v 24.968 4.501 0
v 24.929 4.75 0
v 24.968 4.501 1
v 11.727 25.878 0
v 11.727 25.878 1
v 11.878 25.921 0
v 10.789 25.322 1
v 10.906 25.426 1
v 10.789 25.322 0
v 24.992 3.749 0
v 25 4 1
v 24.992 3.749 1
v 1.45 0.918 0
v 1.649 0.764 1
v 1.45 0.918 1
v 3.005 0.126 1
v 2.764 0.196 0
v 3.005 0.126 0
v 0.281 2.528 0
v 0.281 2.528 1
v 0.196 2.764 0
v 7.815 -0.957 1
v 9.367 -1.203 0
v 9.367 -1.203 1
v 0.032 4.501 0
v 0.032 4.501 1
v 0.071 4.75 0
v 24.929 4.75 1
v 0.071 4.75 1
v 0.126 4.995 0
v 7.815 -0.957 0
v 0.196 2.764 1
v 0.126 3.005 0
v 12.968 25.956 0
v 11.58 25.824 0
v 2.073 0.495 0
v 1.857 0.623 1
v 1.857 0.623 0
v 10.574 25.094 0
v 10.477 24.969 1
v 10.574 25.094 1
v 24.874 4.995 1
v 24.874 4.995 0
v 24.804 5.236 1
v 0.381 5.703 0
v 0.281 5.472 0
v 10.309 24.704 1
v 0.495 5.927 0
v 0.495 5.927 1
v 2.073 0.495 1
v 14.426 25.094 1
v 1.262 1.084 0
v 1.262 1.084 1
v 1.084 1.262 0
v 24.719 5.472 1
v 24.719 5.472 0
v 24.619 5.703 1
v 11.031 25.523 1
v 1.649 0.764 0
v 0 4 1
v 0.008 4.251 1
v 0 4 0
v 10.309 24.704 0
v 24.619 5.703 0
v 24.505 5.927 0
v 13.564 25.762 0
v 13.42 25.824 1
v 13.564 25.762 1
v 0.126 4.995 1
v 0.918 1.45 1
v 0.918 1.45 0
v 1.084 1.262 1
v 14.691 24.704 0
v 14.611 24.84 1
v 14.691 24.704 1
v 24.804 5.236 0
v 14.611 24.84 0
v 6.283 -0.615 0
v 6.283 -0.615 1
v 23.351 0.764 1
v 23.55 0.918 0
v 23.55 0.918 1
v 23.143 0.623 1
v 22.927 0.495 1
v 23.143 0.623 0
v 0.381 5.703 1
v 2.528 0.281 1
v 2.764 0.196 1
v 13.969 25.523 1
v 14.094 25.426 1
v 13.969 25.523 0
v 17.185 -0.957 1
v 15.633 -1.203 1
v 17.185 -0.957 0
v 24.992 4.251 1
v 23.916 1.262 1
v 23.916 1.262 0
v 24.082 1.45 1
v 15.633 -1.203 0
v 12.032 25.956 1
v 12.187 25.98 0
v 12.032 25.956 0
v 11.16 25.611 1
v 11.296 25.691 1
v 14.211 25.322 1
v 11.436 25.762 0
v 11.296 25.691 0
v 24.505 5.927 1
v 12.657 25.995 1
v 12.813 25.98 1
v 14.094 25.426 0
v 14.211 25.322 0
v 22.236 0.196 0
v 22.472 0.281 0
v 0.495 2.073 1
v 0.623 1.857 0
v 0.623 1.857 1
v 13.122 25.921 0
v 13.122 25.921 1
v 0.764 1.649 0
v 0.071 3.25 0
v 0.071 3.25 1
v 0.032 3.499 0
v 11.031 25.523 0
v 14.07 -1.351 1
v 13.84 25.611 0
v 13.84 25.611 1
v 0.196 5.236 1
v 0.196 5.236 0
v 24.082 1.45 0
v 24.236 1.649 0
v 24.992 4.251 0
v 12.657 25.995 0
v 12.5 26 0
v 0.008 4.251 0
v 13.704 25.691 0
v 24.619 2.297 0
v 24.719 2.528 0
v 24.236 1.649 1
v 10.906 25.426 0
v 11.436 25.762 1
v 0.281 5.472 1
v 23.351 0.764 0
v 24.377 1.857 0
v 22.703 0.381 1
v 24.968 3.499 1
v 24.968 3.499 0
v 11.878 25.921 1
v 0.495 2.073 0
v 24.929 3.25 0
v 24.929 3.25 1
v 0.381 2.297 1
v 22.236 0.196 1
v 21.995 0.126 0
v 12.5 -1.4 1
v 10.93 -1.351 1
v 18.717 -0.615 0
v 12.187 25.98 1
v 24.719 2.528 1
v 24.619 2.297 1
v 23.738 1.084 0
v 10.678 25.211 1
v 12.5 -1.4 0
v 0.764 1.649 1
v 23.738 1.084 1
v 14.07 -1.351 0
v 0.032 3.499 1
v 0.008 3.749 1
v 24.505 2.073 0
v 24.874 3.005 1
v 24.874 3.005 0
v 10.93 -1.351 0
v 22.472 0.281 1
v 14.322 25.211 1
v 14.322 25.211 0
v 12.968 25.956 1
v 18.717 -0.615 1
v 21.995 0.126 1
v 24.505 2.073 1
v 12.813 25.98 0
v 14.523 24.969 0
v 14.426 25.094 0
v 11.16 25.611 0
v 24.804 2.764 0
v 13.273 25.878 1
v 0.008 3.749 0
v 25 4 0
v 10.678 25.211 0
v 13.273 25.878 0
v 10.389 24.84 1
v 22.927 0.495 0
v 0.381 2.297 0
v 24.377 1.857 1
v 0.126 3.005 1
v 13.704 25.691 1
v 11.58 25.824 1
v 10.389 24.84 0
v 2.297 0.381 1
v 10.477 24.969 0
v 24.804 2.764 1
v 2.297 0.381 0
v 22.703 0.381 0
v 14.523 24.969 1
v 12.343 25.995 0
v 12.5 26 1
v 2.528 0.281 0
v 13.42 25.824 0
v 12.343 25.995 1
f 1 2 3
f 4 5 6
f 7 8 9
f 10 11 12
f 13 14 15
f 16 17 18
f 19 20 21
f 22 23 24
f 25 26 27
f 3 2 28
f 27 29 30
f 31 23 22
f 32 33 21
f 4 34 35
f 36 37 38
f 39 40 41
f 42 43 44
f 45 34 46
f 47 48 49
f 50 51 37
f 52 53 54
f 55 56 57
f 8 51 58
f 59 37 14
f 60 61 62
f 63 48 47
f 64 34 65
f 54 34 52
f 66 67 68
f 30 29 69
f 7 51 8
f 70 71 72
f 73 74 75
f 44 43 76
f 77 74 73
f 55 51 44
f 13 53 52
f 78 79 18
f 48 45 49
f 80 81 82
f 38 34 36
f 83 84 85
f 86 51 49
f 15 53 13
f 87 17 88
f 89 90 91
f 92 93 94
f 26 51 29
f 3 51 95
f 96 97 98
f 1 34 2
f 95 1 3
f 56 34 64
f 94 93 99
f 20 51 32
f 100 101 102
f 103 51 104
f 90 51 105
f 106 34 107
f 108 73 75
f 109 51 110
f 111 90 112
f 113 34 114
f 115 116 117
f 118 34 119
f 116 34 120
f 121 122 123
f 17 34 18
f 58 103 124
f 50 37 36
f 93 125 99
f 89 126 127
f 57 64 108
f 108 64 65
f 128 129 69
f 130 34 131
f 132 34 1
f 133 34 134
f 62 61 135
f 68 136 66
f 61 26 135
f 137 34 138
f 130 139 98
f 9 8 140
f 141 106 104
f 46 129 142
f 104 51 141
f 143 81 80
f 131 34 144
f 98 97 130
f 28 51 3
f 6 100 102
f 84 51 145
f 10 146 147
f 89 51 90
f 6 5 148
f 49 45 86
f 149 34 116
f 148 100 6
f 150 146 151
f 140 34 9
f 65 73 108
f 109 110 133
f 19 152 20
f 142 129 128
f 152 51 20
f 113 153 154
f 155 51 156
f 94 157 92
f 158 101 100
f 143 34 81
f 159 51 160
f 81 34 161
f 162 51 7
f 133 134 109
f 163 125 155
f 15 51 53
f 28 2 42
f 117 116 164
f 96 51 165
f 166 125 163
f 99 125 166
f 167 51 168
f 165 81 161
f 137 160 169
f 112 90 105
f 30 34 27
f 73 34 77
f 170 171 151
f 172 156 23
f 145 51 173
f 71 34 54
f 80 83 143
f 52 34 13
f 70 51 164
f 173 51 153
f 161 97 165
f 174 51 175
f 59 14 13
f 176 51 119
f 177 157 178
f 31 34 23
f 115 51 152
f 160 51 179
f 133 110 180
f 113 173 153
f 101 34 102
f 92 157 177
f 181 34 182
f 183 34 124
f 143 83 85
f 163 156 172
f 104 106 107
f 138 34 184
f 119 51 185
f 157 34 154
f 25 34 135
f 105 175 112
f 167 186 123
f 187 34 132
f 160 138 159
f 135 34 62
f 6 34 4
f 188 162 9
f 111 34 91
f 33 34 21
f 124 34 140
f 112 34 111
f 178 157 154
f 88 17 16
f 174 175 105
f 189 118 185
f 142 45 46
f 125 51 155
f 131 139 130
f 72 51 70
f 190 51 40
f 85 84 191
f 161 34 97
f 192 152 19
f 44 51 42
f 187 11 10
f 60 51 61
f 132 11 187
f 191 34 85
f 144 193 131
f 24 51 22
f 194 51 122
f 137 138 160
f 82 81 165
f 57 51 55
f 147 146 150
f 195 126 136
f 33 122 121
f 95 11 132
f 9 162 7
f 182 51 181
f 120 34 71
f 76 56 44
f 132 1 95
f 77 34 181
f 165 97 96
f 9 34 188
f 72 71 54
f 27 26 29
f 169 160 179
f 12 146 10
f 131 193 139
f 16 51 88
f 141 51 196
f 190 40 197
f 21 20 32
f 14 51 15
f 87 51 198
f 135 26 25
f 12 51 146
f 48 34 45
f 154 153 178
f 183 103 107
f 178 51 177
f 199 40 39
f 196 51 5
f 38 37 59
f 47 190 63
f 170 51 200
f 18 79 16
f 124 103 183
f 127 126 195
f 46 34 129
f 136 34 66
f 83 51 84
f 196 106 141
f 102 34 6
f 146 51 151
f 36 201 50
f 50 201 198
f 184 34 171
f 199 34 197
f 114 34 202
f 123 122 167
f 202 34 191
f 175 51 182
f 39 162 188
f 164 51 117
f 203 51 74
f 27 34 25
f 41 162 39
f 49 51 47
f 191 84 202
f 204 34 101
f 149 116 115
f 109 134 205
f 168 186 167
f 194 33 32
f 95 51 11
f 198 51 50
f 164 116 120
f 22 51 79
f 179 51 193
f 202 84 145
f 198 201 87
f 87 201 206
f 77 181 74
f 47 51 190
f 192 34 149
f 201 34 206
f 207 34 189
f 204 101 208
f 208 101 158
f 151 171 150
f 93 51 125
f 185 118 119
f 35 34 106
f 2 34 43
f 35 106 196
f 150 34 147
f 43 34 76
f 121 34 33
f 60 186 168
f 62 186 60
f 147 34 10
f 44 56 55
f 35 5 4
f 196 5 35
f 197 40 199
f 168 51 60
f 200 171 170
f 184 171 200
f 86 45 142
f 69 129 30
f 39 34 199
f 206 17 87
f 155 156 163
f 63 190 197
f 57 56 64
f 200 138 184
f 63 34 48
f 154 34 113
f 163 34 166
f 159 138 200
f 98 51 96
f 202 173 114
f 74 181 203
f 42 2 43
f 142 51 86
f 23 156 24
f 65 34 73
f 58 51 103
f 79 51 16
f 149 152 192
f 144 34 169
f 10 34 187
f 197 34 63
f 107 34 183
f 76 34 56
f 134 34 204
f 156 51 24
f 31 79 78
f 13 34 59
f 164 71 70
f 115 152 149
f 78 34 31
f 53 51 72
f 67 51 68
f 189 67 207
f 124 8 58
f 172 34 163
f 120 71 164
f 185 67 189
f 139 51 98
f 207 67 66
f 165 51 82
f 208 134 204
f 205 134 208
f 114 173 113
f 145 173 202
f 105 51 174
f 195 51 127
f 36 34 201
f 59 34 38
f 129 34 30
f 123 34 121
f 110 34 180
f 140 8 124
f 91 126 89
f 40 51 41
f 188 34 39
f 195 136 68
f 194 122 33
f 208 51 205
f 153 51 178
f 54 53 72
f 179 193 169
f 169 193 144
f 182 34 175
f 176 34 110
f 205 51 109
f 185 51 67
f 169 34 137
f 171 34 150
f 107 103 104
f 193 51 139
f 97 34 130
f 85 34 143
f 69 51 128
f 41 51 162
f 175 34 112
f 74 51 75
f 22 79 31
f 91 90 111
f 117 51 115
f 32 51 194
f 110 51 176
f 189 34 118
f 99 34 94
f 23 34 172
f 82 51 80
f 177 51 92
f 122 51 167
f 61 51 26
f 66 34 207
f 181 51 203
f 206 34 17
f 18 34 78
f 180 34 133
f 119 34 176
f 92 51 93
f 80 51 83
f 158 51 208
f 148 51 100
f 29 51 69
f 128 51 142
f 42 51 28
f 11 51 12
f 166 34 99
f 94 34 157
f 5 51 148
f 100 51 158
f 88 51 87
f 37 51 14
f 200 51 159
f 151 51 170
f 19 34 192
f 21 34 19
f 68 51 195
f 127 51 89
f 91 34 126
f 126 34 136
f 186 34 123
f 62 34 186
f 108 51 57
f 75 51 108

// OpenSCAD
// preview[vi5ew:south, tilt:top]

// Grading thickness
// Images
// Text / Letters
// Colour

/* [Main] */

//how wide to make the guitar pick
base = 25;

//how tall to make the guitar pick
height = 30;

//how thick to make the guitar pick
thickness = 1;

//how rounded to make the corners
radii = [4, 4, 2.5];

//how curved to make the base (0 is straight)
curve = 25;

//adjusts how close the curve is to the center of the pick
curve_offset = 1.4;

//how smooth to render all circles
smooth = 100;

module pick(base, height, t, r, curve, co) {
  r0 = max(radii[0], 0.01);
  r1 = max(radii[1], 0.01);
  r2 = max(radii[2], 0.01);

  lw = r0 + r1;
  lh = r2 + max(r0, r1);

  hull()
  {
    translate([r0, r0, 0]) {
      cylinder(r=r0, h=t, $fn=smooth);
    }

    translate([base-r1, r1, 0]) {
      cylinder(r=r1, h=t, $fn=smooth);
    }

    translate([(base-r1+r0)/2, height-lh, 0]) {
      cylinder(r=r2, h=t, $fn=smooth);
    }

    if (curve > 0) {
translate([base/2, curve-co, 0])
difference() {
  rotate_extrude($fn=smooth)
    translate([curve-.01, 0, 0])
      square([.01, t]);
  translate([base/2-lw/2, -curve, -1])
    cube([curve, curve*2, t+1]);
  translate([-curve, 0, -1])
    cube([curve*2, curve, t+1]);
  translate([-curve-(base/2-lw/2), -curve, -1])
    cube([curve, curve, t+1]);
}
    }
  }
}

pick(base, height, thickness, radii, curve, curve_offset);
